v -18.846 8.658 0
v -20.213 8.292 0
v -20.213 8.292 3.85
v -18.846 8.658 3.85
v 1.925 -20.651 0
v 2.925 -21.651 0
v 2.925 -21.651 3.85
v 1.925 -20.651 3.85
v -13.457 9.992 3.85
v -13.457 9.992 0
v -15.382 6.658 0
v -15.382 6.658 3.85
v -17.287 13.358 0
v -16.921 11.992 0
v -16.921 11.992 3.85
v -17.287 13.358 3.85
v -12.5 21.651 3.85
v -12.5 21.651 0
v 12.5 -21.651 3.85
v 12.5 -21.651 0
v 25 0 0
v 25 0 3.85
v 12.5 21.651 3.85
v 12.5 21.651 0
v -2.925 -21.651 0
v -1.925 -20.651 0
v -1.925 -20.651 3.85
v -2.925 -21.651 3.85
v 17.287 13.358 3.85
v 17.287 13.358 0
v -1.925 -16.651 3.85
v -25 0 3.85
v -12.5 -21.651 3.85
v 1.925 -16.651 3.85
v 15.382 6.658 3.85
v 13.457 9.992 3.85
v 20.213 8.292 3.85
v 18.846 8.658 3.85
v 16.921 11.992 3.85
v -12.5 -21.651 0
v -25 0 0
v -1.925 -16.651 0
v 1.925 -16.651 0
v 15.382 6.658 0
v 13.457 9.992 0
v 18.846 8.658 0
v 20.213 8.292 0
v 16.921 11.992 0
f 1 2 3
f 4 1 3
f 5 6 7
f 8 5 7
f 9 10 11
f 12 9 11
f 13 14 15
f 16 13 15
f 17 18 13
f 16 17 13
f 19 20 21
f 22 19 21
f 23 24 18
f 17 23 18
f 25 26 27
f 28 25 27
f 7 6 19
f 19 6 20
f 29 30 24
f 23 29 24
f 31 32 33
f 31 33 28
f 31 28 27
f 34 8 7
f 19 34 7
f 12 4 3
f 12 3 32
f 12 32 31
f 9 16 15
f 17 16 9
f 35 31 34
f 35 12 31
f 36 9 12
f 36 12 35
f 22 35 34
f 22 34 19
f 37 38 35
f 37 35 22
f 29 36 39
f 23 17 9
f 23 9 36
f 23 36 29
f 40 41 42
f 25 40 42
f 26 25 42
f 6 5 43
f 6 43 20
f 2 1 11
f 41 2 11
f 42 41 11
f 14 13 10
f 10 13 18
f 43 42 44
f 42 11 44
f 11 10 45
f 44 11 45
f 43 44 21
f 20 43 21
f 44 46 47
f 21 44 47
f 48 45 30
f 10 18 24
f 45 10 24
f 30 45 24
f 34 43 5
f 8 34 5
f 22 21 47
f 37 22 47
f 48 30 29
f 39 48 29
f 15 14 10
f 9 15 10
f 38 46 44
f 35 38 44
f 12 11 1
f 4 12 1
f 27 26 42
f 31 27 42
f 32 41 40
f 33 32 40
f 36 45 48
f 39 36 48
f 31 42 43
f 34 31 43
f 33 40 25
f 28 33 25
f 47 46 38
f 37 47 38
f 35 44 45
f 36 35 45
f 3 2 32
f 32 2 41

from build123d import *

# Parameters (mm, degrees)
BOSS_EXTRUDE1_DEPTH = 3.85
CHAMFER1_SIZE       = 1


with BuildPart() as part:
    # Sketch1 → Boss-Extrude1 (new body)
    with BuildSketch(Plane.XY):
        Polygon((25, 0), (19.7125, 9.158218645), (15.382372981, 6.658218645), (13.457372981, 9.99241645), (17.7875, 12.49241645), (12.5, 21.650635095), (-12.5, 21.650635095), (-17.7875, 12.49241645), (-13.457372981, 9.99241645), (-15.382372981, 6.658218645), (-19.7125, 9.158218645), (-25, 0), (-12.5, -21.650635095), (-1.925, -21.650635095), (-1.925, -16.650635095), (1.925, -16.650635095), (1.925, -21.650635095), (12.5, -21.650635095), align=None)
    extrude(amount=BOSS_EXTRUDE1_DEPTH)

    # Chamfer1
    chamfer1_edges = [part.edges().sort_by_distance(p)[0] for p in [
        (1.925, -21.650635095, 1.925),
        (-1.925, -21.650635095, 1.925),
        (-19.7125, 9.158218645, 1.925),
        (-17.7875, 12.49241645, 1.925),
        (17.7875, 12.49241645, 1.925),
        (19.7125, 9.158218645, 1.925),
    ]]
    chamfer(chamfer1_edges, length=CHAMFER1_SIZE)


solid = part.part
